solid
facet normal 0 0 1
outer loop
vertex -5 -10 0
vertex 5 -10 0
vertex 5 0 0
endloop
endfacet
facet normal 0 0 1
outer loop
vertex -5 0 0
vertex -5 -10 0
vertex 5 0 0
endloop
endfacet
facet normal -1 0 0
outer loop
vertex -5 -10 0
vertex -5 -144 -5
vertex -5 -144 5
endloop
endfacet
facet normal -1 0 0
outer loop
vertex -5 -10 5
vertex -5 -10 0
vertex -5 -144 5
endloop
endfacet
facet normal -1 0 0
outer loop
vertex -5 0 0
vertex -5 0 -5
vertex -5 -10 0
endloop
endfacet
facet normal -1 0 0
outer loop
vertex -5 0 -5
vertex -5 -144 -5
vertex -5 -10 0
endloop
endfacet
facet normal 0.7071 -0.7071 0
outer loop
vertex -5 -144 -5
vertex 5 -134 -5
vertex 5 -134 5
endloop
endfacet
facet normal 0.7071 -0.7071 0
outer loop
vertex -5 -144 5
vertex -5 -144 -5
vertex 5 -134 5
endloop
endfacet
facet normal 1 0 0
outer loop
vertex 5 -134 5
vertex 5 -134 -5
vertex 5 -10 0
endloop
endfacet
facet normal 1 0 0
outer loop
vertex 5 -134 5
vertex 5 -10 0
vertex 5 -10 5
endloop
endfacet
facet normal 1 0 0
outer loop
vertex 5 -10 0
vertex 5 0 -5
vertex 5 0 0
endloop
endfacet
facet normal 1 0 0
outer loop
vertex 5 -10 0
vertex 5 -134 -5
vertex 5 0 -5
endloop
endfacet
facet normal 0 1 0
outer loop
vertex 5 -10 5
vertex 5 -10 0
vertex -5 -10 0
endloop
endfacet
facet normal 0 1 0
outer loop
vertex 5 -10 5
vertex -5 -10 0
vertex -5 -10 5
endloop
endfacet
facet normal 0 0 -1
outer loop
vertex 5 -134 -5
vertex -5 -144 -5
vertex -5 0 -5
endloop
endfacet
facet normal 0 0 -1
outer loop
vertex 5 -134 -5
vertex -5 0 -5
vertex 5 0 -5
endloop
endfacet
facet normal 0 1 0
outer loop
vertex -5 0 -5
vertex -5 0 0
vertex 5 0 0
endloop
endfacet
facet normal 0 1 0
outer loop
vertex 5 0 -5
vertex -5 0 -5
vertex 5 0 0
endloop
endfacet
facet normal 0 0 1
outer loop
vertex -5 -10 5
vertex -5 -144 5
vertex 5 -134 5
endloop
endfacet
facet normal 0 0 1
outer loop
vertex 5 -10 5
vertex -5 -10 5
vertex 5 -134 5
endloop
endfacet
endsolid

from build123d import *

# Parameters (mm, degrees)
F0_W     = 10
F0_H     = 10
F1_DEPTH = 144
F2_W     = 10
F2_H     = 5
F3_DEPTH = 10
F4_SIZE  = 9.99999


# Not quite as in the source:
# - a fillet or chamfer is up to 0.001 mm smaller than in the source, because OpenCascade refuses the exact size


with BuildPart() as f1:
    # F0 (on Front) → F1 (new body)
    with BuildSketch(Plane.XZ):
        Rectangle(F0_W, F0_H)
    extrude(amount=F1_DEPTH)

    # F2 (on face) → F3 (cut)
    with BuildSketch(Plane.YZ.offset(5)):
        with Locations((-5, 2.5)):
            Rectangle(F2_W, F2_H)
    extrude(amount=-F3_DEPTH, mode=Mode.SUBTRACT)

    # F4 (size 10 in the source; OpenCascade refuses exactly that, so slightly less here)
    f4_edges = [f1.edges().sort_by_distance(p)[0] for p in [
        (5, -144, 0),
    ]]
    chamfer(f4_edges, length=F4_SIZE)


solid = f1.part
